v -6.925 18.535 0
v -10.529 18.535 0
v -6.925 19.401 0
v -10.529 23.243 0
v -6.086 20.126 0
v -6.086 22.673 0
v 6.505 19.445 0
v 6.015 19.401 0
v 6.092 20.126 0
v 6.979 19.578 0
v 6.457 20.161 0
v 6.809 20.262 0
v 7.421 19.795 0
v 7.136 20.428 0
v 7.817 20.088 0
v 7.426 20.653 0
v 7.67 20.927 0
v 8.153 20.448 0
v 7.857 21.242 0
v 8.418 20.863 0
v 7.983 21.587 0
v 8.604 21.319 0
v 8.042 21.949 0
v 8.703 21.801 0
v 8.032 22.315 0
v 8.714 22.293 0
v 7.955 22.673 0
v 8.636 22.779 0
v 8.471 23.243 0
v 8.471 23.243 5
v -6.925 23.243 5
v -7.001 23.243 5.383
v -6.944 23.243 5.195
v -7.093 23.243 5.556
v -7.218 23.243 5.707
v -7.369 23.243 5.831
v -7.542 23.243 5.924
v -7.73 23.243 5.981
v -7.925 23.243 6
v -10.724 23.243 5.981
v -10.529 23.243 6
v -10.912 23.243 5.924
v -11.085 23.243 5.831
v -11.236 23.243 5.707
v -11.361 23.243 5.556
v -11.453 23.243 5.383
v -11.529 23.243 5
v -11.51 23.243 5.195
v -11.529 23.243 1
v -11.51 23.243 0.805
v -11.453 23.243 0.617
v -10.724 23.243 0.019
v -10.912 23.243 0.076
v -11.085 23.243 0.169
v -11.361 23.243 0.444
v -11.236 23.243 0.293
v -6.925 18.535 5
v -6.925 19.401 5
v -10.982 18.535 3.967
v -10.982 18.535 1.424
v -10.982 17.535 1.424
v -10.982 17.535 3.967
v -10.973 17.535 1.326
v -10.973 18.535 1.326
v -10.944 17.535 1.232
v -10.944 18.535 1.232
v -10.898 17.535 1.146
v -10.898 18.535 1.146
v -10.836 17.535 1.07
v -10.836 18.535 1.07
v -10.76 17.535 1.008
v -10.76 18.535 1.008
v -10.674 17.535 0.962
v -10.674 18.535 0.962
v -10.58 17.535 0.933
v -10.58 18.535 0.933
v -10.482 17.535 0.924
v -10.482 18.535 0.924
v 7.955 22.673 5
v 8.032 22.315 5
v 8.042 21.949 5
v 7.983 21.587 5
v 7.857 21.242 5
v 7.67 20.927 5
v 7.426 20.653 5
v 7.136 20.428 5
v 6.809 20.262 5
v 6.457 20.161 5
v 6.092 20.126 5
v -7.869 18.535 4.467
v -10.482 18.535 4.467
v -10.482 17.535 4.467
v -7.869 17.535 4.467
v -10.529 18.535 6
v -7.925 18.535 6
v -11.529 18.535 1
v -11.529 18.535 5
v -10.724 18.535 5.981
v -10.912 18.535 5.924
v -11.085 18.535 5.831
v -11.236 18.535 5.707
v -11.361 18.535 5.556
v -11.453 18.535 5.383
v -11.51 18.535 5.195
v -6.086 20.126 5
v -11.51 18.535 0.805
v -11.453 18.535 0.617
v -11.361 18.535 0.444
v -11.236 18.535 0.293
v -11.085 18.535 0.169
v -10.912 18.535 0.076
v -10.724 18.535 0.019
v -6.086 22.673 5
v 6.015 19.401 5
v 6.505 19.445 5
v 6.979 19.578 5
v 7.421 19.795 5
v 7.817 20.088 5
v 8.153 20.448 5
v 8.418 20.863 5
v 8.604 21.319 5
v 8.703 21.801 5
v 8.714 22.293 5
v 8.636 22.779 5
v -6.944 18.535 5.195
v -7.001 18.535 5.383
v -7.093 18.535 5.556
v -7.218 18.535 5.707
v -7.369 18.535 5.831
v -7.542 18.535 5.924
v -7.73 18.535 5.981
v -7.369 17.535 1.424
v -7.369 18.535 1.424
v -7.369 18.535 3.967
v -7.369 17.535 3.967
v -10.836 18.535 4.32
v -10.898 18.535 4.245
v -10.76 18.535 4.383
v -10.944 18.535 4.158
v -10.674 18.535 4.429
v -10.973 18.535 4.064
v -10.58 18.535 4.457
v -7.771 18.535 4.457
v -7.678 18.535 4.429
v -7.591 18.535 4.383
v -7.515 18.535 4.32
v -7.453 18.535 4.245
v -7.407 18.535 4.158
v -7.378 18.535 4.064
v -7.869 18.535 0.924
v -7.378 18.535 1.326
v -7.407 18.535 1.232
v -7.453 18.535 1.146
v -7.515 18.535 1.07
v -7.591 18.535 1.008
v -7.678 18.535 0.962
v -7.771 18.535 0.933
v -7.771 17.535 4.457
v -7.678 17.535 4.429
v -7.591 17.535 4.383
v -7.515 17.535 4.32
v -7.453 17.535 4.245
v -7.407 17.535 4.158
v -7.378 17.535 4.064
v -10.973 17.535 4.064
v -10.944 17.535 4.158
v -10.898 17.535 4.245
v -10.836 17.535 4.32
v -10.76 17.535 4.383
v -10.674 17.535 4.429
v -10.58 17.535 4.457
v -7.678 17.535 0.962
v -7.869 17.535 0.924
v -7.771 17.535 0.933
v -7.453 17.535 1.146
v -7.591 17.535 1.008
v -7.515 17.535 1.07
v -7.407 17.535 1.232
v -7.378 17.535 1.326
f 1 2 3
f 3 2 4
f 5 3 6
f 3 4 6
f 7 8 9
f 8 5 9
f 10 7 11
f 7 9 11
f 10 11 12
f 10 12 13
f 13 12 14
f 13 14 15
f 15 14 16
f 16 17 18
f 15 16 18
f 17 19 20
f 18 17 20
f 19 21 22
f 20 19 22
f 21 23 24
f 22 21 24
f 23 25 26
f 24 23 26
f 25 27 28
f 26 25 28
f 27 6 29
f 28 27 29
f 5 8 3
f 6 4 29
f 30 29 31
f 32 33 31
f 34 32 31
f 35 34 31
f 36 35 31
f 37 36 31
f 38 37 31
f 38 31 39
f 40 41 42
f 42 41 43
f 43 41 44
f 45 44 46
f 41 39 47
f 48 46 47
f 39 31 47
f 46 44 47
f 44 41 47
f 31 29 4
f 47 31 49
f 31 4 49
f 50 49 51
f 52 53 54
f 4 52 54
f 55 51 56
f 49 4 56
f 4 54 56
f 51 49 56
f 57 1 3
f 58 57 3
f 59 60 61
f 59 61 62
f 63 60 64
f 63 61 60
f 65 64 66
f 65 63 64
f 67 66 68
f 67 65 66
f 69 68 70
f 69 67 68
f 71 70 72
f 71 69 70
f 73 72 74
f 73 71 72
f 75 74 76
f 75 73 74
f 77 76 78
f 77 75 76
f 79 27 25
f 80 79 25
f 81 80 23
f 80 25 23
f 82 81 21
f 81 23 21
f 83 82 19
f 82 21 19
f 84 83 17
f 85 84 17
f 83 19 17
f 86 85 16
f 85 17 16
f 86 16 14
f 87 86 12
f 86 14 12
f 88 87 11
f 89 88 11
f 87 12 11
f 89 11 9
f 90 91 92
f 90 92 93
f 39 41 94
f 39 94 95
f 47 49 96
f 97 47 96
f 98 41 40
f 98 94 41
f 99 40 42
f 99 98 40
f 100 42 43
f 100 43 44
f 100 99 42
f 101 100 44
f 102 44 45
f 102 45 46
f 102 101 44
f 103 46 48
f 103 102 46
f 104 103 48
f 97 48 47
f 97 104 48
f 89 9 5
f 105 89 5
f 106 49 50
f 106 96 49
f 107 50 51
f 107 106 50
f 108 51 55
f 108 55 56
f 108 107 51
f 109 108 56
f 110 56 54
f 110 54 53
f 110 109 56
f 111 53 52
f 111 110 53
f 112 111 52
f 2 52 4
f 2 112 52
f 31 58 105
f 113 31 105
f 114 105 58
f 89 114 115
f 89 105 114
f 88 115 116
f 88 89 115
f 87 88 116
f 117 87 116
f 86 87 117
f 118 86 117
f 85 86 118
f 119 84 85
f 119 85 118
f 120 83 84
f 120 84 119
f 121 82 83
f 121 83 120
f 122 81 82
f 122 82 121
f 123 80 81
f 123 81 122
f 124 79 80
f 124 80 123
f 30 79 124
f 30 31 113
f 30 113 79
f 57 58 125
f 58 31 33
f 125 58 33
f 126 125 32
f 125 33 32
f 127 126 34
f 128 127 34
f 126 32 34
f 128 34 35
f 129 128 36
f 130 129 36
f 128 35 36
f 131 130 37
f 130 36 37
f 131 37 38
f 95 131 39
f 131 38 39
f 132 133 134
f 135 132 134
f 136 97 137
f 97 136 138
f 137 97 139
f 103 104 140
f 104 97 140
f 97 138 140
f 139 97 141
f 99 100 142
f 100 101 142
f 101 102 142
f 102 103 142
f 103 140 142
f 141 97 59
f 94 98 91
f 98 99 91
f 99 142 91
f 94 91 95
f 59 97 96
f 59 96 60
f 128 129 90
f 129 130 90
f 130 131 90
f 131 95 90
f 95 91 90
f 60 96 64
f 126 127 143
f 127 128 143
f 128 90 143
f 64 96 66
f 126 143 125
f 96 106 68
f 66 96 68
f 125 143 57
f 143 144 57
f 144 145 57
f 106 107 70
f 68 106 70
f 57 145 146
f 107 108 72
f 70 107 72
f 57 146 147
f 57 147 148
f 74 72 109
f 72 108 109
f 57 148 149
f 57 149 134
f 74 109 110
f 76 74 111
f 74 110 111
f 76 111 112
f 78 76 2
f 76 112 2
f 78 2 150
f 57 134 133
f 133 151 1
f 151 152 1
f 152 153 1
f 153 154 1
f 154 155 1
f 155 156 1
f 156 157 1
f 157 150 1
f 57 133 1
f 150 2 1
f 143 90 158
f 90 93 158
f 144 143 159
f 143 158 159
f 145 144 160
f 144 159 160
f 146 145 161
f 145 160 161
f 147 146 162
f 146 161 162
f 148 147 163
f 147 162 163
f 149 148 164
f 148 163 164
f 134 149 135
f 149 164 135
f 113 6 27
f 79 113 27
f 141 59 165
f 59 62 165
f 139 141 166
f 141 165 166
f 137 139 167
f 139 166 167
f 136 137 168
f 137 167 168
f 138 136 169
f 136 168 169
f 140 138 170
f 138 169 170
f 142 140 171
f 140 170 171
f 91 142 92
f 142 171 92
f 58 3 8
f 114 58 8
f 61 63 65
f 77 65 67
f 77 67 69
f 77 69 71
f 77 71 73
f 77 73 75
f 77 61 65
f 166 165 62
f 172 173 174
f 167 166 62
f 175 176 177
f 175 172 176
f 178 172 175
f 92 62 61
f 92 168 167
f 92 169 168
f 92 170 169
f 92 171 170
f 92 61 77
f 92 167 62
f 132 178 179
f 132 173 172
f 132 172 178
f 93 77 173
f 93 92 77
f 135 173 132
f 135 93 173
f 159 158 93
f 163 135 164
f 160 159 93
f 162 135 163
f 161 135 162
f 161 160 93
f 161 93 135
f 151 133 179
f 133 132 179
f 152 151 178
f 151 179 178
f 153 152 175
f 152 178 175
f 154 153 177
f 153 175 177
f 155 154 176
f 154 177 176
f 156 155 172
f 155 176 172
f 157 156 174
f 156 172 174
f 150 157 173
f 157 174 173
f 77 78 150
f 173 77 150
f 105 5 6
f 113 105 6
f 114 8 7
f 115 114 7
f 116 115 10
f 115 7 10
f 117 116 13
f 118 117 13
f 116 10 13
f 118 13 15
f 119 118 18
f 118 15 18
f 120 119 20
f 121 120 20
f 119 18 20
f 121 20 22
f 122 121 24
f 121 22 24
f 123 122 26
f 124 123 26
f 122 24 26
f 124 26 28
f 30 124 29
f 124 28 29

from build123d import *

# Parameters (mm, degrees)
F1_DEPTH = 5
F2_DEPTH = 6
F3_W     = 3.613461
F3_H     = 3.543161
F4_DEPTH = 1
F5_R     = 1
F6_R     = 0.5


with BuildPart() as f1:
    # F0 (on Top) → F1 (new body)
    with BuildSketch(Plane.XY):
        with BuildLine():
            Line((8.470888, 23.242861), (-6.924916, 23.242861))
            Line((-6.924916, 23.242861), (-6.924916, 19.400692))
            Line((-6.924916, 19.400692), (6.014677, 19.400692))
            ThreePointArc((6.014677, 19.400692), (8.294767, 20.649267), (8.470888, 23.242861))
        make_face()
        with BuildLine():
            Line((-6.086436, 20.126112), (-6.086436, 22.673488))
            Line((-6.086436, 22.673488), (7.95457, 22.673488))
            ThreePointArc((7.95457, 22.673488), (7.669569, 20.927019), (6.091618, 20.126112))
            Line((6.091618, 20.126112), (-6.086436, 20.126112))
        make_face(mode=Mode.SUBTRACT)
    extrude(amount=F1_DEPTH)

    # F0 (on Top) → F2 (join)
    with BuildSketch(Plane.XY):
        Polygon((-6.924916, 23.242861), (-11.529112, 23.242861), (-11.529112, 18.535126), (-6.924916, 18.535126), (-6.924916, 19.400692), align=None)
    extrude(amount=F2_DEPTH)

    # F3 (on face) → F4 (join)
    with BuildSketch(Plane.XZ.offset(-18.535126)):
        with Locations((-9.175593, 2.695312)):
            Rectangle(F3_W, F3_H)
    extrude(amount=F4_DEPTH)

    # F5
    f5_edges = [f1.edges().sort_by_distance(p)[0] for p in [
        (-11.529112, 20.888994, 6),
        (-6.924916, 20.888994, 6),
        (-11.529112, 20.888994, 0),
    ]]
    fillet(f5_edges, radius=F5_R)

    # F6
    f6_edges = [f1.edges().sort_by_distance(p)[0] for p in [
        (-10.982323, 18.035126, 4.466893),
        (-7.368862, 18.035126, 4.466893),
        (-10.982323, 18.035126, 0.923732),
        (-7.368862, 18.035126, 0.923732),
    ]]
    fillet(f6_edges, radius=F6_R)


solid = f1.part
